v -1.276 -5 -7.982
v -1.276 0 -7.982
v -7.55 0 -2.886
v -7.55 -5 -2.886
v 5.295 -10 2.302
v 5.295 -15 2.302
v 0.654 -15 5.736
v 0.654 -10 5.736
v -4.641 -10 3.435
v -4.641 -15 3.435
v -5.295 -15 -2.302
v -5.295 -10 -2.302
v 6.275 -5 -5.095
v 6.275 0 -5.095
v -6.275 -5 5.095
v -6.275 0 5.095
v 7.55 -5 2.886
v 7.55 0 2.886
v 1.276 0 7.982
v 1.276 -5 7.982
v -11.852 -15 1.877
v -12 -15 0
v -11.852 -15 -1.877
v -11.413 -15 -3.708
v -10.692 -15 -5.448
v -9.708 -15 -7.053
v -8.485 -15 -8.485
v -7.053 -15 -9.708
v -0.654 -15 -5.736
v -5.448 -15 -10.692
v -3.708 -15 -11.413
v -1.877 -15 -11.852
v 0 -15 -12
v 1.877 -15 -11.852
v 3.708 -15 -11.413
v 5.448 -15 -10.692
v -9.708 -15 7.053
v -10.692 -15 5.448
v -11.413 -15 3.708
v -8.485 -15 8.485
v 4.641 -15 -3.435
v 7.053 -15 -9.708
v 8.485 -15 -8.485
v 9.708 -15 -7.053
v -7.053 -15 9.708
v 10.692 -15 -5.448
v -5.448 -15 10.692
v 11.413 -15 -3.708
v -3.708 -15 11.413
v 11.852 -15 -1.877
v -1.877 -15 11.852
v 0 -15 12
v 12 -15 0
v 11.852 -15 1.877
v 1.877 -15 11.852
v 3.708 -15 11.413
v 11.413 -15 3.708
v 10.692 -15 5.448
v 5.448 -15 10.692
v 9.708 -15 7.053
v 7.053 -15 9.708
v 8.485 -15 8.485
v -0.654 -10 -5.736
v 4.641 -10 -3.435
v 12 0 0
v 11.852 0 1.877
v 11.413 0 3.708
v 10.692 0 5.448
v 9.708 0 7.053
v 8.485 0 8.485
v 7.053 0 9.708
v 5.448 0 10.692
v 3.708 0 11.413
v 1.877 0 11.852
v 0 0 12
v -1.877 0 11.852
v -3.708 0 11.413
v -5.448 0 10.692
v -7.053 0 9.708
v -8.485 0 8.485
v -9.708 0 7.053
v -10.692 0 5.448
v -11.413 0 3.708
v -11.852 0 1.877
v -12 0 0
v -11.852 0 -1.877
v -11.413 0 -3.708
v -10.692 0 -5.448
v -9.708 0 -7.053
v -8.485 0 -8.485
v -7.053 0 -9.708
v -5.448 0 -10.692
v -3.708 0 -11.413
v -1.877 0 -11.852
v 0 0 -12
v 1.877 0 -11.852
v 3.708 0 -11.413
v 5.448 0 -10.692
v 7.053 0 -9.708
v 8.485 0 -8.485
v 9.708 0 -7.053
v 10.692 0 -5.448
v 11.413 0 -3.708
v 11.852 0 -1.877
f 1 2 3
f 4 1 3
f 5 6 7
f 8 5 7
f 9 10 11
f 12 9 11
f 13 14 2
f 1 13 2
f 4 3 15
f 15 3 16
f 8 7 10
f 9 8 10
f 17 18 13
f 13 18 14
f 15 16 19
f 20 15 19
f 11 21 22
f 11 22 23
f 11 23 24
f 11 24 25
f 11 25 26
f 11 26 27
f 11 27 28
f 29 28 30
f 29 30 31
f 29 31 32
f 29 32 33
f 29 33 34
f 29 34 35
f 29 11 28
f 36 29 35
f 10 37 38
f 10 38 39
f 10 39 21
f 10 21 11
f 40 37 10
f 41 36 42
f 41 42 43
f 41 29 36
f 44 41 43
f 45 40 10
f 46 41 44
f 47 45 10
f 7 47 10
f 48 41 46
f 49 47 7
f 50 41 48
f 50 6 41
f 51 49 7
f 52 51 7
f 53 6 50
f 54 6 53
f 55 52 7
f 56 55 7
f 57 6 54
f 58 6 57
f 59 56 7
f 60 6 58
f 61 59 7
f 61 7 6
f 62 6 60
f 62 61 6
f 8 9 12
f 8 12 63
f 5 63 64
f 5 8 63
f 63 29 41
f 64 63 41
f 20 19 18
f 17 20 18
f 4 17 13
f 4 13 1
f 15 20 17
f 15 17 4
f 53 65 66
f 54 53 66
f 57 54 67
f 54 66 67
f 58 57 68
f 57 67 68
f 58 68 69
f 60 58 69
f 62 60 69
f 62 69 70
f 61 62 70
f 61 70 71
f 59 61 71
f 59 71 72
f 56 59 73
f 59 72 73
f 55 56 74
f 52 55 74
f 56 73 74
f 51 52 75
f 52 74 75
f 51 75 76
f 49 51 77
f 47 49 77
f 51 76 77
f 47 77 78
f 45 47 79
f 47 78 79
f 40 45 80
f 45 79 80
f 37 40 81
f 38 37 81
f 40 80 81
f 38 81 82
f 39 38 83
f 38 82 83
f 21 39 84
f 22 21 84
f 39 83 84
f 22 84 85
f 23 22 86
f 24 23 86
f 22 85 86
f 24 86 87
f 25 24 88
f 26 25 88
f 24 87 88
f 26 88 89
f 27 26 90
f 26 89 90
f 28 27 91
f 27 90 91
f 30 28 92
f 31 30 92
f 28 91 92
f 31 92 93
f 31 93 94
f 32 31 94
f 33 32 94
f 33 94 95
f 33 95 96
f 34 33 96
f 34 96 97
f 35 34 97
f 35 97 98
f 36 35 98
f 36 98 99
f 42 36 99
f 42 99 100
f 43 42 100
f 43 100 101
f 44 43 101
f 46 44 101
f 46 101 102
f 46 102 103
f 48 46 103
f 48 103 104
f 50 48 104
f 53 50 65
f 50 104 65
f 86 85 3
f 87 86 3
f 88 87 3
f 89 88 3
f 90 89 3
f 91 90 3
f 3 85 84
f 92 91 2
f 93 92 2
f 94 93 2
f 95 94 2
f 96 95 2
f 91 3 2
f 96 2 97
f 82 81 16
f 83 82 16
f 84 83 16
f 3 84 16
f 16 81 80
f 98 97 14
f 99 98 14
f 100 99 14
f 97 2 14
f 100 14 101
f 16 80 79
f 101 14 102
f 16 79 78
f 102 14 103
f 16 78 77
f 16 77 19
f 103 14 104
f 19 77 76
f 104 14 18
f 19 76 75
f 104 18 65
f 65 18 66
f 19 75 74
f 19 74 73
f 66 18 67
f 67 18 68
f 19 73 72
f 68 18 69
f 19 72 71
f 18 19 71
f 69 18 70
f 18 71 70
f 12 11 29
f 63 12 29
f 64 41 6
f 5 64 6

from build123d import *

# Parameters (mm, degrees)
F0_R     = 12
F1_DEPTH = 15
F3_DEPTH = 5
F5_DEPTH = 5


with BuildPart() as f1:
    # F0 (on Front) → F1 (new body)
    with BuildSketch(Plane.XZ):
        Circle(F0_R)
    extrude(amount=F1_DEPTH)

    # F2 (on face) → F3 (cut)
    with BuildSketch(Plane.XZ.offset(15)):
        Polygon((5.294932, 2.301527), (0.654286, 5.736309), (-4.640647, 3.434783), (-5.294932, -2.301527), (-0.654286, -5.736309), (4.640647, -3.434783), align=None)
    extrude(amount=-F3_DEPTH, mode=Mode.SUBTRACT)

    # F4 (on face) → F5 (cut)
    with BuildSketch(Plane(origin=(0, 0, 0), x_dir=(-1, 0, 0), z_dir=(0, 1, 0))):
        Polygon((6.274529, 5.095451), (-1.275526, 7.981627), (-7.550054, 2.886176), (-6.274529, -5.095451), (1.275526, -7.981627), (7.550054, -2.886176), align=None)
    extrude(amount=-F5_DEPTH, mode=Mode.SUBTRACT)


solid = f1.part
